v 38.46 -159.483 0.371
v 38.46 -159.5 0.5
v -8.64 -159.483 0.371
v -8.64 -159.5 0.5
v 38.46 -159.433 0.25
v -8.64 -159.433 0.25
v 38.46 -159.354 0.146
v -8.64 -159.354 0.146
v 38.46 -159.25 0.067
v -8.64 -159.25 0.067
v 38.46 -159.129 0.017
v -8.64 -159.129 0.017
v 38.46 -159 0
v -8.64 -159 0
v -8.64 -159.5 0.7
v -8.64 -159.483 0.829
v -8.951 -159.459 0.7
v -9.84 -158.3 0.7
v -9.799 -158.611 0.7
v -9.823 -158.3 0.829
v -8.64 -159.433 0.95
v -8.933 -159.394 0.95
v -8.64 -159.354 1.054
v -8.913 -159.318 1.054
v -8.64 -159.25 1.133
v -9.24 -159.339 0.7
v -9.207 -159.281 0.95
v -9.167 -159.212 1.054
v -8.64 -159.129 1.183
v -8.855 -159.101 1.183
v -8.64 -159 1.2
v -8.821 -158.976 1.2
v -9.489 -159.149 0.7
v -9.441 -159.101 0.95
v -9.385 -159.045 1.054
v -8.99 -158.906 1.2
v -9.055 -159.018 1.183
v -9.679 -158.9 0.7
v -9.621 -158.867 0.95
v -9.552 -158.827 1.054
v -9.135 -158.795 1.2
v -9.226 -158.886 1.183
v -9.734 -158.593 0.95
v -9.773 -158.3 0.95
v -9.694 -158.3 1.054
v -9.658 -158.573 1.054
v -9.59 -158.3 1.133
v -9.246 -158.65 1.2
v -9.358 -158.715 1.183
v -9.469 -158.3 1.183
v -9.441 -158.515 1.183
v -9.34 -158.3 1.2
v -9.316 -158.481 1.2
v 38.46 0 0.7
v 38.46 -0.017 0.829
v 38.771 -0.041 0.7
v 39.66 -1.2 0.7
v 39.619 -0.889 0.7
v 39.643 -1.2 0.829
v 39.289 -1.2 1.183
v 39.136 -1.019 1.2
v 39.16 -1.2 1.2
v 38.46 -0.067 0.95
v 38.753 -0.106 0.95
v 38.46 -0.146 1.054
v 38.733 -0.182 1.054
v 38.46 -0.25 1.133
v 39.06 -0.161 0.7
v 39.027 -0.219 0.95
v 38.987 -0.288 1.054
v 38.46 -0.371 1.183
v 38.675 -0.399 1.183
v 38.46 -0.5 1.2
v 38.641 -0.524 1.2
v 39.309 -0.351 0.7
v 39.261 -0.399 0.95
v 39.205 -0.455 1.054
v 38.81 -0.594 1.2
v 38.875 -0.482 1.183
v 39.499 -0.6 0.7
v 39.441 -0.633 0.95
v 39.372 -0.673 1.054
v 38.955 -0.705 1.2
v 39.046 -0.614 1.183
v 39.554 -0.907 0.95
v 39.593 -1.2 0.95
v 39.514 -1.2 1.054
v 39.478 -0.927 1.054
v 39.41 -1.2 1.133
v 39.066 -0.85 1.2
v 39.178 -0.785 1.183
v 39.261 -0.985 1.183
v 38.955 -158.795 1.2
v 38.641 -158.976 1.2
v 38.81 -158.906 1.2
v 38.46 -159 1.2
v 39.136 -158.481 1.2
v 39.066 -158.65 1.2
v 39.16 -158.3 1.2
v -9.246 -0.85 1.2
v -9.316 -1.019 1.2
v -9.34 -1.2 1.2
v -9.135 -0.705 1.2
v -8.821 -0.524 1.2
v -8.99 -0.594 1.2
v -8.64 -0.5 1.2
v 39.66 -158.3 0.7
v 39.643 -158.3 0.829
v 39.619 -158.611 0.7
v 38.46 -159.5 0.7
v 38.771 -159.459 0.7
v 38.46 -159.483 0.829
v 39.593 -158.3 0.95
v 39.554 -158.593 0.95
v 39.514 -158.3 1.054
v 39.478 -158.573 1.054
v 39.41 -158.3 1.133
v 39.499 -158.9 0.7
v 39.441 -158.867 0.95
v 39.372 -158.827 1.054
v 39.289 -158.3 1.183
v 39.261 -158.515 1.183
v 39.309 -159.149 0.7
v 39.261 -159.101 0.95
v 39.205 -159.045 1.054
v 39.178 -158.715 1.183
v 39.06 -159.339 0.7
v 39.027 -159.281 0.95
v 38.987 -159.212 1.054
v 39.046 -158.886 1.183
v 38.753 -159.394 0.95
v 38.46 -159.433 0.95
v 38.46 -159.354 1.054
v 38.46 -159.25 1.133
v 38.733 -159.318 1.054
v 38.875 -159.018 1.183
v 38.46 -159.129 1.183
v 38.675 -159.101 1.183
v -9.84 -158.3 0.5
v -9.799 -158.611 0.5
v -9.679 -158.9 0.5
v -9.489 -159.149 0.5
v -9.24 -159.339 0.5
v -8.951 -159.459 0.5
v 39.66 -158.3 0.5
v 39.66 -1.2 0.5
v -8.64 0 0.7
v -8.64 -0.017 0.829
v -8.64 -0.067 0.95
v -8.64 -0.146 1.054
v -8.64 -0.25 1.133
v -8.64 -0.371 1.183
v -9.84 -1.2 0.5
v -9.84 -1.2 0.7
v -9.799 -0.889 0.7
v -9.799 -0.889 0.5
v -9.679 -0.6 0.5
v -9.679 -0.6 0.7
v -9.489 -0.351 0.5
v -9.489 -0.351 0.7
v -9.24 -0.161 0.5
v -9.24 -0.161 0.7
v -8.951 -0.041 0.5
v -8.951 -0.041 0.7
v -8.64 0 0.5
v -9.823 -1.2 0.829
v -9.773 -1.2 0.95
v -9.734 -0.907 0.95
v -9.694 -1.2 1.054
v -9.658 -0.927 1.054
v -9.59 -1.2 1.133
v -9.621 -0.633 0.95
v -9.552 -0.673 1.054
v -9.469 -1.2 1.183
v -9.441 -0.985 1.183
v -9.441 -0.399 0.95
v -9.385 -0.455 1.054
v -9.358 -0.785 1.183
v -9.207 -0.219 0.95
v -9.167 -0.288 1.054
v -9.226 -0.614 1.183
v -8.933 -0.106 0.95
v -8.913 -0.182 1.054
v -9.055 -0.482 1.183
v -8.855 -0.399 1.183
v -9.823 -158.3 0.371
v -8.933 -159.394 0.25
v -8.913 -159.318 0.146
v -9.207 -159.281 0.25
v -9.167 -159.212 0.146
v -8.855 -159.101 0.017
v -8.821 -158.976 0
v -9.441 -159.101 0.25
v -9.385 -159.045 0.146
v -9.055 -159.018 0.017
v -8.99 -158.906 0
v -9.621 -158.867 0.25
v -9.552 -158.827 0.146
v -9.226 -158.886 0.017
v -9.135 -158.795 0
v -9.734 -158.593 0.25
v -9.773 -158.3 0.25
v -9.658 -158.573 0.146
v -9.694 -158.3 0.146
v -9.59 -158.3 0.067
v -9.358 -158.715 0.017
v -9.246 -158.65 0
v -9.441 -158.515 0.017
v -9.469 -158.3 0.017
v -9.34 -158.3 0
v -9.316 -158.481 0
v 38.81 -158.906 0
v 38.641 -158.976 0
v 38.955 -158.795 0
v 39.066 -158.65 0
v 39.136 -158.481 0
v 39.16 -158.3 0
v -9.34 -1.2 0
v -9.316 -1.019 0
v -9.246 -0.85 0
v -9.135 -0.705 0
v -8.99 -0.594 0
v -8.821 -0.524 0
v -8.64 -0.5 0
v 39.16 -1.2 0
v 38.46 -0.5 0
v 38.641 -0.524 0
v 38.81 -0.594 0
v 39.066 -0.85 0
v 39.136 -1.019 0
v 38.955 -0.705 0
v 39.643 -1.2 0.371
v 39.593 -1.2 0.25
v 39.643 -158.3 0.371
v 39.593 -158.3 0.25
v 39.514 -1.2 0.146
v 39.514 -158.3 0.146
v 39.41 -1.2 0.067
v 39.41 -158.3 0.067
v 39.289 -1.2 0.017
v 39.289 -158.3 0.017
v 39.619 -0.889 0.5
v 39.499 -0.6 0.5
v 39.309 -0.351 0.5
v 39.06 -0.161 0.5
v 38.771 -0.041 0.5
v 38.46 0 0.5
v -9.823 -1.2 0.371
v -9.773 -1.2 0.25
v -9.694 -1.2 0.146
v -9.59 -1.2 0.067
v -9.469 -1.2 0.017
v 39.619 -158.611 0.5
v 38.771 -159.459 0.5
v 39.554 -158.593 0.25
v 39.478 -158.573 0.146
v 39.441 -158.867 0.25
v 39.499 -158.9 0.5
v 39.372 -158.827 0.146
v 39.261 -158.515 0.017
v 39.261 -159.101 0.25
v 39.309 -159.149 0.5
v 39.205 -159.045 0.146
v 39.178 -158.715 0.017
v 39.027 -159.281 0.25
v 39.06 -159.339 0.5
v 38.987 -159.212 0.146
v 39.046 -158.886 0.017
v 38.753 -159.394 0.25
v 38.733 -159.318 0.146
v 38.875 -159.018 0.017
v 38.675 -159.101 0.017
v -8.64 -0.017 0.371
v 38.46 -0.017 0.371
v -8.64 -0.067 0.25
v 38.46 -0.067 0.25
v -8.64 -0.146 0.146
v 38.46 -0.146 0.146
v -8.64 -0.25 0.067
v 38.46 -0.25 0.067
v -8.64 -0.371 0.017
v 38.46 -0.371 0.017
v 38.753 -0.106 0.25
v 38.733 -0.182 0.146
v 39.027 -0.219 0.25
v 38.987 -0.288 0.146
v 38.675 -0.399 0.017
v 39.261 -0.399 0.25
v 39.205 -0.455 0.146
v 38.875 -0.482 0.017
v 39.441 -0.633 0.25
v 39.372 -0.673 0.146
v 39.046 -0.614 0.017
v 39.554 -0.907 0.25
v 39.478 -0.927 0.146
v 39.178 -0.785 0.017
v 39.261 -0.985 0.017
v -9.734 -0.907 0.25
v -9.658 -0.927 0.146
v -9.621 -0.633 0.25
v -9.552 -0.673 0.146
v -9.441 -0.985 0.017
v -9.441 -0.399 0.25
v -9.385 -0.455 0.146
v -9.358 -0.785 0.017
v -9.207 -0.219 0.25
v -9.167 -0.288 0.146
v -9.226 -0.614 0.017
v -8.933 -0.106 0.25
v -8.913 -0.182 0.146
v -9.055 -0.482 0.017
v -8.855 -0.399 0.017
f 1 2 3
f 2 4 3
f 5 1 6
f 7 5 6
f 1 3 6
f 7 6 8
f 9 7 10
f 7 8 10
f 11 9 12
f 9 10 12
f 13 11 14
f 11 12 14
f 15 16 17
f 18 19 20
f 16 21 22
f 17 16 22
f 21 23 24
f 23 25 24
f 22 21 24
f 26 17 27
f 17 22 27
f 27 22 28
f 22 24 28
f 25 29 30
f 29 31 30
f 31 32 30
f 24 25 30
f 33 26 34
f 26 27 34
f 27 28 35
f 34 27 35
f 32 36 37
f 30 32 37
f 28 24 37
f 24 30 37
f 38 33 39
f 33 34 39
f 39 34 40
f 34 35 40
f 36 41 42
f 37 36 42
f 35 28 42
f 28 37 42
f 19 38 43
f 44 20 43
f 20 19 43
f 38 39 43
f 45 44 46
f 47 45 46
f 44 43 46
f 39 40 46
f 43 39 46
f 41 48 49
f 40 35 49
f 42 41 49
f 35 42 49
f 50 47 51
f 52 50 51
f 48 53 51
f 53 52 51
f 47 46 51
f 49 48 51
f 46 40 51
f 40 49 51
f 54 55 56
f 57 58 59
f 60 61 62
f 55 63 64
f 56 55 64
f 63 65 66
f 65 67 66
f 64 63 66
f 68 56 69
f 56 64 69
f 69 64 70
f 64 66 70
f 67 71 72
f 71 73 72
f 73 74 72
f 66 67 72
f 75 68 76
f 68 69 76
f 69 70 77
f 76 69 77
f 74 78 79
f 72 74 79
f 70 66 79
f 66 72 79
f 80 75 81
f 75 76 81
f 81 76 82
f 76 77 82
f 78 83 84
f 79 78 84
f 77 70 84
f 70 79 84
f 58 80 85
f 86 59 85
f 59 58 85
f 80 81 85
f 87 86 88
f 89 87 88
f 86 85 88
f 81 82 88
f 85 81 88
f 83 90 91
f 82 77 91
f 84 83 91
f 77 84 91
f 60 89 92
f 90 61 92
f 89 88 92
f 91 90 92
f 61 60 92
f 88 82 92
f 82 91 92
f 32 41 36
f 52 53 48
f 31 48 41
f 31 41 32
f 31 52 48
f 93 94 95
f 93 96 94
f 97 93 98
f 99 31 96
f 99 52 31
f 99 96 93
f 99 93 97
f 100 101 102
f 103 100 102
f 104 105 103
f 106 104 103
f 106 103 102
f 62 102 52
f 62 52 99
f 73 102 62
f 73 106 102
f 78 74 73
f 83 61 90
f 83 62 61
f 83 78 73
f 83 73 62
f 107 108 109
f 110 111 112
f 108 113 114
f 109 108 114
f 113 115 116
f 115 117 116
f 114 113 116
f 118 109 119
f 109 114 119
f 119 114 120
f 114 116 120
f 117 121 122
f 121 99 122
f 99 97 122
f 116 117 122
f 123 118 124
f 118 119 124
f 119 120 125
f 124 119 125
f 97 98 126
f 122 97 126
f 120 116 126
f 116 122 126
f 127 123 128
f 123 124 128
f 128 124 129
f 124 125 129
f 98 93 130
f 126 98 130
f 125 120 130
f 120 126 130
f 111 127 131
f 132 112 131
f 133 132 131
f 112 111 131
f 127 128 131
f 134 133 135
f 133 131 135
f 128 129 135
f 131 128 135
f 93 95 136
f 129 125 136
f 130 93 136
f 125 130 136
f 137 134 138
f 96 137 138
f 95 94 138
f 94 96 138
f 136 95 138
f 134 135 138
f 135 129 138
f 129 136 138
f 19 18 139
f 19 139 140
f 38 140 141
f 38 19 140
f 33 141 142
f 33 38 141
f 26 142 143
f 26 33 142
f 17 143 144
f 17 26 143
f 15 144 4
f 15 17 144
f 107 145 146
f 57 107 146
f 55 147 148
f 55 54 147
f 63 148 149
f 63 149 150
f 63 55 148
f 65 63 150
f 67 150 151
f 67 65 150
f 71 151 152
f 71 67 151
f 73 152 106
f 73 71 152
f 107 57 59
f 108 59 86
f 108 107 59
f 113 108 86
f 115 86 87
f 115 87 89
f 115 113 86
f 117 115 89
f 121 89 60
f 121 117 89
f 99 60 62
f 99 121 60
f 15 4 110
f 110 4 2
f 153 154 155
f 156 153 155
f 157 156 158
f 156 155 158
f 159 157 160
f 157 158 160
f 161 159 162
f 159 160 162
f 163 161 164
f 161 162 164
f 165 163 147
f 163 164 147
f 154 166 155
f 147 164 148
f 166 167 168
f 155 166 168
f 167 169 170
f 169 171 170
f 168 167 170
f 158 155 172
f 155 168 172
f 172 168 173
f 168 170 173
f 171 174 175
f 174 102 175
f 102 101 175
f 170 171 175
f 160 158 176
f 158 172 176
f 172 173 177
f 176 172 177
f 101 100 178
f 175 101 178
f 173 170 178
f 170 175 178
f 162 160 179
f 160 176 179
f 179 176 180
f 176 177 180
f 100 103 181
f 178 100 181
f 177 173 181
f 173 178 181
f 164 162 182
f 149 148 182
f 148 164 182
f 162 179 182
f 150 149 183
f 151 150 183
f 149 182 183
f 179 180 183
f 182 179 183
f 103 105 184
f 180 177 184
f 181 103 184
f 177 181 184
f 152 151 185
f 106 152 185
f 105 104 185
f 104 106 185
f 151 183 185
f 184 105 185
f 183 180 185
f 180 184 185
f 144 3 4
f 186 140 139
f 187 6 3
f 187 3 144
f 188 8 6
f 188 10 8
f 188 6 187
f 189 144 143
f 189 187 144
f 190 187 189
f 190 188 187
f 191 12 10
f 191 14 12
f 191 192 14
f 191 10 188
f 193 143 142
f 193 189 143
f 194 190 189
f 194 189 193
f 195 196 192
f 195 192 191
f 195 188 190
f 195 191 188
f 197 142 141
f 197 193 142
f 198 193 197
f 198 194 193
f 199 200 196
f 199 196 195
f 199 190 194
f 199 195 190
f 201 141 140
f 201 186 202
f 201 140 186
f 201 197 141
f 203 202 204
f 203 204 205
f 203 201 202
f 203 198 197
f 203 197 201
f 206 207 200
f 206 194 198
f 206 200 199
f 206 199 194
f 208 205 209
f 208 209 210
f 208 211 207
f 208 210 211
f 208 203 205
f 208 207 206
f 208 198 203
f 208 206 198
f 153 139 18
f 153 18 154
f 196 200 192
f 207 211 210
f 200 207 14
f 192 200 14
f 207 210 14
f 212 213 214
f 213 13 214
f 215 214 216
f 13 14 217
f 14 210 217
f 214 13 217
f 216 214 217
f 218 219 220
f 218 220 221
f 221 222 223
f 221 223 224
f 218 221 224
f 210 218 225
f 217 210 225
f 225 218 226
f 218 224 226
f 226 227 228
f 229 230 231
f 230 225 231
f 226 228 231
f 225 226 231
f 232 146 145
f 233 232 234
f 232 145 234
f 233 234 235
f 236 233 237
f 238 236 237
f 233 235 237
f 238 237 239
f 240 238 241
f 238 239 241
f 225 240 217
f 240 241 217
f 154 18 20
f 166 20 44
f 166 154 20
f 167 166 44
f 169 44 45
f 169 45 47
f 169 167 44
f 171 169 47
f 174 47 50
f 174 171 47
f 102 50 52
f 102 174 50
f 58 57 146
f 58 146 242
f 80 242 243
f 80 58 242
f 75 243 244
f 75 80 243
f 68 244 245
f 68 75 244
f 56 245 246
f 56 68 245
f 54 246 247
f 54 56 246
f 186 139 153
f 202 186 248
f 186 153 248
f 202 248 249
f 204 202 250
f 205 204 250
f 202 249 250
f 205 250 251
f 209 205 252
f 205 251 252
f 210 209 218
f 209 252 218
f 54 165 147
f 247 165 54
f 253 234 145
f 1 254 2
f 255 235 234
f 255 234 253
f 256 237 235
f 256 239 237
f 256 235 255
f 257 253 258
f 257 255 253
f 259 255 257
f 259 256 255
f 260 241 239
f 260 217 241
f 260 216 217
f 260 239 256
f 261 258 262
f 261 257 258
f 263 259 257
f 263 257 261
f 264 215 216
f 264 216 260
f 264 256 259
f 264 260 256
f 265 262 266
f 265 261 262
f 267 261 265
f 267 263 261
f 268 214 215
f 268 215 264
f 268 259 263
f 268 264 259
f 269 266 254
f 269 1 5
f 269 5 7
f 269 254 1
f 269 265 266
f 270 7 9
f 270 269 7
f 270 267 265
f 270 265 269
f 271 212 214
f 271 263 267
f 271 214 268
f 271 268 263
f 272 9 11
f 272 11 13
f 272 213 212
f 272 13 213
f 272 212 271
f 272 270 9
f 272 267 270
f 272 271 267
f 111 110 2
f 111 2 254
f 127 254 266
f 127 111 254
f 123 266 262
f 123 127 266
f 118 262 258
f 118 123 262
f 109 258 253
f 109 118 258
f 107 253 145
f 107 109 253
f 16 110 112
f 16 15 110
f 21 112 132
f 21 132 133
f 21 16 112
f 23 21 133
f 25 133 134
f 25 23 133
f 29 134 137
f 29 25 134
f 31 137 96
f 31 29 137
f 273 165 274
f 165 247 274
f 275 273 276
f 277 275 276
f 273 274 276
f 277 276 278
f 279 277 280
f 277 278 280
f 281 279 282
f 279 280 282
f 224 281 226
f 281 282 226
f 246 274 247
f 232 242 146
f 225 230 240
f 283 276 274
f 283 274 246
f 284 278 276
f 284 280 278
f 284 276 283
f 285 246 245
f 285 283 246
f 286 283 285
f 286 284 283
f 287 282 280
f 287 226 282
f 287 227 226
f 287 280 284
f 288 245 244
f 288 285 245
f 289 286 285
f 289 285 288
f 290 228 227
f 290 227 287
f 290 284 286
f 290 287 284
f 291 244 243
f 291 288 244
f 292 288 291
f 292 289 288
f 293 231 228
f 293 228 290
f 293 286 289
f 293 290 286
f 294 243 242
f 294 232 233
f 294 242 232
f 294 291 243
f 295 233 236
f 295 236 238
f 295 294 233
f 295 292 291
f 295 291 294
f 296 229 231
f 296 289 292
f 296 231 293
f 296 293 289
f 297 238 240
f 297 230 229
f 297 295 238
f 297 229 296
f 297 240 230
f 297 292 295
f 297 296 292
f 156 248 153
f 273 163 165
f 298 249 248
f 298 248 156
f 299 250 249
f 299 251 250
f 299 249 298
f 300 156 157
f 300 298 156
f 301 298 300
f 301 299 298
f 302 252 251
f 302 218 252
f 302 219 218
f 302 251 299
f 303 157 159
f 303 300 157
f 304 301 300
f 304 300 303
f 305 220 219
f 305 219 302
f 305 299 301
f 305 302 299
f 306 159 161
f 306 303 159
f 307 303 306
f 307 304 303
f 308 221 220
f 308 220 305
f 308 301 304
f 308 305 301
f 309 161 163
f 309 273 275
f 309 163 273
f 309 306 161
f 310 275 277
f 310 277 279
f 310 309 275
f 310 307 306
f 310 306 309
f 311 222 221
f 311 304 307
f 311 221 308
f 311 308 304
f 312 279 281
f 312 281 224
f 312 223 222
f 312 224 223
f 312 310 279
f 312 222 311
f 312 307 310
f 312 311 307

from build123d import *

# Parameters (mm, degrees)
SKETCH001_W  = 49.5
SKETCH001_H  = 159.5
PAD001_DEPTH = 1.2
FILLET004_R  = 1.2
FILLET005_R  = 0.5
FILLET006_R  = 0.5


with BuildPart() as part:
    # Sketch001 → Pad001 (new body)
    with BuildSketch(Plane.XY):
        with Locations((14.91, -79.75)):
            Rectangle(SKETCH001_W, SKETCH001_H)
    extrude(amount=PAD001_DEPTH)

    # Fillet004
    fillet004_edges = [part.edges().sort_by_distance(p)[0] for p in [
        (39.66, -159.5, 0.6),
        (39.66, 0, 0.6),
        (-9.84, 0, 0.6),
        (-9.84, -159.5, 0.6),
    ]]
    fillet(fillet004_edges, radius=FILLET004_R)

    # Fillet005
    fillet005_edges = [part.edges().sort_by_distance(p)[0] for p in [
        (-9.84, -79.75, 0),
    ]]
    fillet(fillet005_edges, radius=FILLET005_R)

    # Fillet006
    fillet006_edges = [part.edges().sort_by_distance(p)[0] for p in [
        (-9.84, -79.75, 1.2),
    ]]
    fillet(fillet006_edges, radius=FILLET006_R)


solid = part.part
